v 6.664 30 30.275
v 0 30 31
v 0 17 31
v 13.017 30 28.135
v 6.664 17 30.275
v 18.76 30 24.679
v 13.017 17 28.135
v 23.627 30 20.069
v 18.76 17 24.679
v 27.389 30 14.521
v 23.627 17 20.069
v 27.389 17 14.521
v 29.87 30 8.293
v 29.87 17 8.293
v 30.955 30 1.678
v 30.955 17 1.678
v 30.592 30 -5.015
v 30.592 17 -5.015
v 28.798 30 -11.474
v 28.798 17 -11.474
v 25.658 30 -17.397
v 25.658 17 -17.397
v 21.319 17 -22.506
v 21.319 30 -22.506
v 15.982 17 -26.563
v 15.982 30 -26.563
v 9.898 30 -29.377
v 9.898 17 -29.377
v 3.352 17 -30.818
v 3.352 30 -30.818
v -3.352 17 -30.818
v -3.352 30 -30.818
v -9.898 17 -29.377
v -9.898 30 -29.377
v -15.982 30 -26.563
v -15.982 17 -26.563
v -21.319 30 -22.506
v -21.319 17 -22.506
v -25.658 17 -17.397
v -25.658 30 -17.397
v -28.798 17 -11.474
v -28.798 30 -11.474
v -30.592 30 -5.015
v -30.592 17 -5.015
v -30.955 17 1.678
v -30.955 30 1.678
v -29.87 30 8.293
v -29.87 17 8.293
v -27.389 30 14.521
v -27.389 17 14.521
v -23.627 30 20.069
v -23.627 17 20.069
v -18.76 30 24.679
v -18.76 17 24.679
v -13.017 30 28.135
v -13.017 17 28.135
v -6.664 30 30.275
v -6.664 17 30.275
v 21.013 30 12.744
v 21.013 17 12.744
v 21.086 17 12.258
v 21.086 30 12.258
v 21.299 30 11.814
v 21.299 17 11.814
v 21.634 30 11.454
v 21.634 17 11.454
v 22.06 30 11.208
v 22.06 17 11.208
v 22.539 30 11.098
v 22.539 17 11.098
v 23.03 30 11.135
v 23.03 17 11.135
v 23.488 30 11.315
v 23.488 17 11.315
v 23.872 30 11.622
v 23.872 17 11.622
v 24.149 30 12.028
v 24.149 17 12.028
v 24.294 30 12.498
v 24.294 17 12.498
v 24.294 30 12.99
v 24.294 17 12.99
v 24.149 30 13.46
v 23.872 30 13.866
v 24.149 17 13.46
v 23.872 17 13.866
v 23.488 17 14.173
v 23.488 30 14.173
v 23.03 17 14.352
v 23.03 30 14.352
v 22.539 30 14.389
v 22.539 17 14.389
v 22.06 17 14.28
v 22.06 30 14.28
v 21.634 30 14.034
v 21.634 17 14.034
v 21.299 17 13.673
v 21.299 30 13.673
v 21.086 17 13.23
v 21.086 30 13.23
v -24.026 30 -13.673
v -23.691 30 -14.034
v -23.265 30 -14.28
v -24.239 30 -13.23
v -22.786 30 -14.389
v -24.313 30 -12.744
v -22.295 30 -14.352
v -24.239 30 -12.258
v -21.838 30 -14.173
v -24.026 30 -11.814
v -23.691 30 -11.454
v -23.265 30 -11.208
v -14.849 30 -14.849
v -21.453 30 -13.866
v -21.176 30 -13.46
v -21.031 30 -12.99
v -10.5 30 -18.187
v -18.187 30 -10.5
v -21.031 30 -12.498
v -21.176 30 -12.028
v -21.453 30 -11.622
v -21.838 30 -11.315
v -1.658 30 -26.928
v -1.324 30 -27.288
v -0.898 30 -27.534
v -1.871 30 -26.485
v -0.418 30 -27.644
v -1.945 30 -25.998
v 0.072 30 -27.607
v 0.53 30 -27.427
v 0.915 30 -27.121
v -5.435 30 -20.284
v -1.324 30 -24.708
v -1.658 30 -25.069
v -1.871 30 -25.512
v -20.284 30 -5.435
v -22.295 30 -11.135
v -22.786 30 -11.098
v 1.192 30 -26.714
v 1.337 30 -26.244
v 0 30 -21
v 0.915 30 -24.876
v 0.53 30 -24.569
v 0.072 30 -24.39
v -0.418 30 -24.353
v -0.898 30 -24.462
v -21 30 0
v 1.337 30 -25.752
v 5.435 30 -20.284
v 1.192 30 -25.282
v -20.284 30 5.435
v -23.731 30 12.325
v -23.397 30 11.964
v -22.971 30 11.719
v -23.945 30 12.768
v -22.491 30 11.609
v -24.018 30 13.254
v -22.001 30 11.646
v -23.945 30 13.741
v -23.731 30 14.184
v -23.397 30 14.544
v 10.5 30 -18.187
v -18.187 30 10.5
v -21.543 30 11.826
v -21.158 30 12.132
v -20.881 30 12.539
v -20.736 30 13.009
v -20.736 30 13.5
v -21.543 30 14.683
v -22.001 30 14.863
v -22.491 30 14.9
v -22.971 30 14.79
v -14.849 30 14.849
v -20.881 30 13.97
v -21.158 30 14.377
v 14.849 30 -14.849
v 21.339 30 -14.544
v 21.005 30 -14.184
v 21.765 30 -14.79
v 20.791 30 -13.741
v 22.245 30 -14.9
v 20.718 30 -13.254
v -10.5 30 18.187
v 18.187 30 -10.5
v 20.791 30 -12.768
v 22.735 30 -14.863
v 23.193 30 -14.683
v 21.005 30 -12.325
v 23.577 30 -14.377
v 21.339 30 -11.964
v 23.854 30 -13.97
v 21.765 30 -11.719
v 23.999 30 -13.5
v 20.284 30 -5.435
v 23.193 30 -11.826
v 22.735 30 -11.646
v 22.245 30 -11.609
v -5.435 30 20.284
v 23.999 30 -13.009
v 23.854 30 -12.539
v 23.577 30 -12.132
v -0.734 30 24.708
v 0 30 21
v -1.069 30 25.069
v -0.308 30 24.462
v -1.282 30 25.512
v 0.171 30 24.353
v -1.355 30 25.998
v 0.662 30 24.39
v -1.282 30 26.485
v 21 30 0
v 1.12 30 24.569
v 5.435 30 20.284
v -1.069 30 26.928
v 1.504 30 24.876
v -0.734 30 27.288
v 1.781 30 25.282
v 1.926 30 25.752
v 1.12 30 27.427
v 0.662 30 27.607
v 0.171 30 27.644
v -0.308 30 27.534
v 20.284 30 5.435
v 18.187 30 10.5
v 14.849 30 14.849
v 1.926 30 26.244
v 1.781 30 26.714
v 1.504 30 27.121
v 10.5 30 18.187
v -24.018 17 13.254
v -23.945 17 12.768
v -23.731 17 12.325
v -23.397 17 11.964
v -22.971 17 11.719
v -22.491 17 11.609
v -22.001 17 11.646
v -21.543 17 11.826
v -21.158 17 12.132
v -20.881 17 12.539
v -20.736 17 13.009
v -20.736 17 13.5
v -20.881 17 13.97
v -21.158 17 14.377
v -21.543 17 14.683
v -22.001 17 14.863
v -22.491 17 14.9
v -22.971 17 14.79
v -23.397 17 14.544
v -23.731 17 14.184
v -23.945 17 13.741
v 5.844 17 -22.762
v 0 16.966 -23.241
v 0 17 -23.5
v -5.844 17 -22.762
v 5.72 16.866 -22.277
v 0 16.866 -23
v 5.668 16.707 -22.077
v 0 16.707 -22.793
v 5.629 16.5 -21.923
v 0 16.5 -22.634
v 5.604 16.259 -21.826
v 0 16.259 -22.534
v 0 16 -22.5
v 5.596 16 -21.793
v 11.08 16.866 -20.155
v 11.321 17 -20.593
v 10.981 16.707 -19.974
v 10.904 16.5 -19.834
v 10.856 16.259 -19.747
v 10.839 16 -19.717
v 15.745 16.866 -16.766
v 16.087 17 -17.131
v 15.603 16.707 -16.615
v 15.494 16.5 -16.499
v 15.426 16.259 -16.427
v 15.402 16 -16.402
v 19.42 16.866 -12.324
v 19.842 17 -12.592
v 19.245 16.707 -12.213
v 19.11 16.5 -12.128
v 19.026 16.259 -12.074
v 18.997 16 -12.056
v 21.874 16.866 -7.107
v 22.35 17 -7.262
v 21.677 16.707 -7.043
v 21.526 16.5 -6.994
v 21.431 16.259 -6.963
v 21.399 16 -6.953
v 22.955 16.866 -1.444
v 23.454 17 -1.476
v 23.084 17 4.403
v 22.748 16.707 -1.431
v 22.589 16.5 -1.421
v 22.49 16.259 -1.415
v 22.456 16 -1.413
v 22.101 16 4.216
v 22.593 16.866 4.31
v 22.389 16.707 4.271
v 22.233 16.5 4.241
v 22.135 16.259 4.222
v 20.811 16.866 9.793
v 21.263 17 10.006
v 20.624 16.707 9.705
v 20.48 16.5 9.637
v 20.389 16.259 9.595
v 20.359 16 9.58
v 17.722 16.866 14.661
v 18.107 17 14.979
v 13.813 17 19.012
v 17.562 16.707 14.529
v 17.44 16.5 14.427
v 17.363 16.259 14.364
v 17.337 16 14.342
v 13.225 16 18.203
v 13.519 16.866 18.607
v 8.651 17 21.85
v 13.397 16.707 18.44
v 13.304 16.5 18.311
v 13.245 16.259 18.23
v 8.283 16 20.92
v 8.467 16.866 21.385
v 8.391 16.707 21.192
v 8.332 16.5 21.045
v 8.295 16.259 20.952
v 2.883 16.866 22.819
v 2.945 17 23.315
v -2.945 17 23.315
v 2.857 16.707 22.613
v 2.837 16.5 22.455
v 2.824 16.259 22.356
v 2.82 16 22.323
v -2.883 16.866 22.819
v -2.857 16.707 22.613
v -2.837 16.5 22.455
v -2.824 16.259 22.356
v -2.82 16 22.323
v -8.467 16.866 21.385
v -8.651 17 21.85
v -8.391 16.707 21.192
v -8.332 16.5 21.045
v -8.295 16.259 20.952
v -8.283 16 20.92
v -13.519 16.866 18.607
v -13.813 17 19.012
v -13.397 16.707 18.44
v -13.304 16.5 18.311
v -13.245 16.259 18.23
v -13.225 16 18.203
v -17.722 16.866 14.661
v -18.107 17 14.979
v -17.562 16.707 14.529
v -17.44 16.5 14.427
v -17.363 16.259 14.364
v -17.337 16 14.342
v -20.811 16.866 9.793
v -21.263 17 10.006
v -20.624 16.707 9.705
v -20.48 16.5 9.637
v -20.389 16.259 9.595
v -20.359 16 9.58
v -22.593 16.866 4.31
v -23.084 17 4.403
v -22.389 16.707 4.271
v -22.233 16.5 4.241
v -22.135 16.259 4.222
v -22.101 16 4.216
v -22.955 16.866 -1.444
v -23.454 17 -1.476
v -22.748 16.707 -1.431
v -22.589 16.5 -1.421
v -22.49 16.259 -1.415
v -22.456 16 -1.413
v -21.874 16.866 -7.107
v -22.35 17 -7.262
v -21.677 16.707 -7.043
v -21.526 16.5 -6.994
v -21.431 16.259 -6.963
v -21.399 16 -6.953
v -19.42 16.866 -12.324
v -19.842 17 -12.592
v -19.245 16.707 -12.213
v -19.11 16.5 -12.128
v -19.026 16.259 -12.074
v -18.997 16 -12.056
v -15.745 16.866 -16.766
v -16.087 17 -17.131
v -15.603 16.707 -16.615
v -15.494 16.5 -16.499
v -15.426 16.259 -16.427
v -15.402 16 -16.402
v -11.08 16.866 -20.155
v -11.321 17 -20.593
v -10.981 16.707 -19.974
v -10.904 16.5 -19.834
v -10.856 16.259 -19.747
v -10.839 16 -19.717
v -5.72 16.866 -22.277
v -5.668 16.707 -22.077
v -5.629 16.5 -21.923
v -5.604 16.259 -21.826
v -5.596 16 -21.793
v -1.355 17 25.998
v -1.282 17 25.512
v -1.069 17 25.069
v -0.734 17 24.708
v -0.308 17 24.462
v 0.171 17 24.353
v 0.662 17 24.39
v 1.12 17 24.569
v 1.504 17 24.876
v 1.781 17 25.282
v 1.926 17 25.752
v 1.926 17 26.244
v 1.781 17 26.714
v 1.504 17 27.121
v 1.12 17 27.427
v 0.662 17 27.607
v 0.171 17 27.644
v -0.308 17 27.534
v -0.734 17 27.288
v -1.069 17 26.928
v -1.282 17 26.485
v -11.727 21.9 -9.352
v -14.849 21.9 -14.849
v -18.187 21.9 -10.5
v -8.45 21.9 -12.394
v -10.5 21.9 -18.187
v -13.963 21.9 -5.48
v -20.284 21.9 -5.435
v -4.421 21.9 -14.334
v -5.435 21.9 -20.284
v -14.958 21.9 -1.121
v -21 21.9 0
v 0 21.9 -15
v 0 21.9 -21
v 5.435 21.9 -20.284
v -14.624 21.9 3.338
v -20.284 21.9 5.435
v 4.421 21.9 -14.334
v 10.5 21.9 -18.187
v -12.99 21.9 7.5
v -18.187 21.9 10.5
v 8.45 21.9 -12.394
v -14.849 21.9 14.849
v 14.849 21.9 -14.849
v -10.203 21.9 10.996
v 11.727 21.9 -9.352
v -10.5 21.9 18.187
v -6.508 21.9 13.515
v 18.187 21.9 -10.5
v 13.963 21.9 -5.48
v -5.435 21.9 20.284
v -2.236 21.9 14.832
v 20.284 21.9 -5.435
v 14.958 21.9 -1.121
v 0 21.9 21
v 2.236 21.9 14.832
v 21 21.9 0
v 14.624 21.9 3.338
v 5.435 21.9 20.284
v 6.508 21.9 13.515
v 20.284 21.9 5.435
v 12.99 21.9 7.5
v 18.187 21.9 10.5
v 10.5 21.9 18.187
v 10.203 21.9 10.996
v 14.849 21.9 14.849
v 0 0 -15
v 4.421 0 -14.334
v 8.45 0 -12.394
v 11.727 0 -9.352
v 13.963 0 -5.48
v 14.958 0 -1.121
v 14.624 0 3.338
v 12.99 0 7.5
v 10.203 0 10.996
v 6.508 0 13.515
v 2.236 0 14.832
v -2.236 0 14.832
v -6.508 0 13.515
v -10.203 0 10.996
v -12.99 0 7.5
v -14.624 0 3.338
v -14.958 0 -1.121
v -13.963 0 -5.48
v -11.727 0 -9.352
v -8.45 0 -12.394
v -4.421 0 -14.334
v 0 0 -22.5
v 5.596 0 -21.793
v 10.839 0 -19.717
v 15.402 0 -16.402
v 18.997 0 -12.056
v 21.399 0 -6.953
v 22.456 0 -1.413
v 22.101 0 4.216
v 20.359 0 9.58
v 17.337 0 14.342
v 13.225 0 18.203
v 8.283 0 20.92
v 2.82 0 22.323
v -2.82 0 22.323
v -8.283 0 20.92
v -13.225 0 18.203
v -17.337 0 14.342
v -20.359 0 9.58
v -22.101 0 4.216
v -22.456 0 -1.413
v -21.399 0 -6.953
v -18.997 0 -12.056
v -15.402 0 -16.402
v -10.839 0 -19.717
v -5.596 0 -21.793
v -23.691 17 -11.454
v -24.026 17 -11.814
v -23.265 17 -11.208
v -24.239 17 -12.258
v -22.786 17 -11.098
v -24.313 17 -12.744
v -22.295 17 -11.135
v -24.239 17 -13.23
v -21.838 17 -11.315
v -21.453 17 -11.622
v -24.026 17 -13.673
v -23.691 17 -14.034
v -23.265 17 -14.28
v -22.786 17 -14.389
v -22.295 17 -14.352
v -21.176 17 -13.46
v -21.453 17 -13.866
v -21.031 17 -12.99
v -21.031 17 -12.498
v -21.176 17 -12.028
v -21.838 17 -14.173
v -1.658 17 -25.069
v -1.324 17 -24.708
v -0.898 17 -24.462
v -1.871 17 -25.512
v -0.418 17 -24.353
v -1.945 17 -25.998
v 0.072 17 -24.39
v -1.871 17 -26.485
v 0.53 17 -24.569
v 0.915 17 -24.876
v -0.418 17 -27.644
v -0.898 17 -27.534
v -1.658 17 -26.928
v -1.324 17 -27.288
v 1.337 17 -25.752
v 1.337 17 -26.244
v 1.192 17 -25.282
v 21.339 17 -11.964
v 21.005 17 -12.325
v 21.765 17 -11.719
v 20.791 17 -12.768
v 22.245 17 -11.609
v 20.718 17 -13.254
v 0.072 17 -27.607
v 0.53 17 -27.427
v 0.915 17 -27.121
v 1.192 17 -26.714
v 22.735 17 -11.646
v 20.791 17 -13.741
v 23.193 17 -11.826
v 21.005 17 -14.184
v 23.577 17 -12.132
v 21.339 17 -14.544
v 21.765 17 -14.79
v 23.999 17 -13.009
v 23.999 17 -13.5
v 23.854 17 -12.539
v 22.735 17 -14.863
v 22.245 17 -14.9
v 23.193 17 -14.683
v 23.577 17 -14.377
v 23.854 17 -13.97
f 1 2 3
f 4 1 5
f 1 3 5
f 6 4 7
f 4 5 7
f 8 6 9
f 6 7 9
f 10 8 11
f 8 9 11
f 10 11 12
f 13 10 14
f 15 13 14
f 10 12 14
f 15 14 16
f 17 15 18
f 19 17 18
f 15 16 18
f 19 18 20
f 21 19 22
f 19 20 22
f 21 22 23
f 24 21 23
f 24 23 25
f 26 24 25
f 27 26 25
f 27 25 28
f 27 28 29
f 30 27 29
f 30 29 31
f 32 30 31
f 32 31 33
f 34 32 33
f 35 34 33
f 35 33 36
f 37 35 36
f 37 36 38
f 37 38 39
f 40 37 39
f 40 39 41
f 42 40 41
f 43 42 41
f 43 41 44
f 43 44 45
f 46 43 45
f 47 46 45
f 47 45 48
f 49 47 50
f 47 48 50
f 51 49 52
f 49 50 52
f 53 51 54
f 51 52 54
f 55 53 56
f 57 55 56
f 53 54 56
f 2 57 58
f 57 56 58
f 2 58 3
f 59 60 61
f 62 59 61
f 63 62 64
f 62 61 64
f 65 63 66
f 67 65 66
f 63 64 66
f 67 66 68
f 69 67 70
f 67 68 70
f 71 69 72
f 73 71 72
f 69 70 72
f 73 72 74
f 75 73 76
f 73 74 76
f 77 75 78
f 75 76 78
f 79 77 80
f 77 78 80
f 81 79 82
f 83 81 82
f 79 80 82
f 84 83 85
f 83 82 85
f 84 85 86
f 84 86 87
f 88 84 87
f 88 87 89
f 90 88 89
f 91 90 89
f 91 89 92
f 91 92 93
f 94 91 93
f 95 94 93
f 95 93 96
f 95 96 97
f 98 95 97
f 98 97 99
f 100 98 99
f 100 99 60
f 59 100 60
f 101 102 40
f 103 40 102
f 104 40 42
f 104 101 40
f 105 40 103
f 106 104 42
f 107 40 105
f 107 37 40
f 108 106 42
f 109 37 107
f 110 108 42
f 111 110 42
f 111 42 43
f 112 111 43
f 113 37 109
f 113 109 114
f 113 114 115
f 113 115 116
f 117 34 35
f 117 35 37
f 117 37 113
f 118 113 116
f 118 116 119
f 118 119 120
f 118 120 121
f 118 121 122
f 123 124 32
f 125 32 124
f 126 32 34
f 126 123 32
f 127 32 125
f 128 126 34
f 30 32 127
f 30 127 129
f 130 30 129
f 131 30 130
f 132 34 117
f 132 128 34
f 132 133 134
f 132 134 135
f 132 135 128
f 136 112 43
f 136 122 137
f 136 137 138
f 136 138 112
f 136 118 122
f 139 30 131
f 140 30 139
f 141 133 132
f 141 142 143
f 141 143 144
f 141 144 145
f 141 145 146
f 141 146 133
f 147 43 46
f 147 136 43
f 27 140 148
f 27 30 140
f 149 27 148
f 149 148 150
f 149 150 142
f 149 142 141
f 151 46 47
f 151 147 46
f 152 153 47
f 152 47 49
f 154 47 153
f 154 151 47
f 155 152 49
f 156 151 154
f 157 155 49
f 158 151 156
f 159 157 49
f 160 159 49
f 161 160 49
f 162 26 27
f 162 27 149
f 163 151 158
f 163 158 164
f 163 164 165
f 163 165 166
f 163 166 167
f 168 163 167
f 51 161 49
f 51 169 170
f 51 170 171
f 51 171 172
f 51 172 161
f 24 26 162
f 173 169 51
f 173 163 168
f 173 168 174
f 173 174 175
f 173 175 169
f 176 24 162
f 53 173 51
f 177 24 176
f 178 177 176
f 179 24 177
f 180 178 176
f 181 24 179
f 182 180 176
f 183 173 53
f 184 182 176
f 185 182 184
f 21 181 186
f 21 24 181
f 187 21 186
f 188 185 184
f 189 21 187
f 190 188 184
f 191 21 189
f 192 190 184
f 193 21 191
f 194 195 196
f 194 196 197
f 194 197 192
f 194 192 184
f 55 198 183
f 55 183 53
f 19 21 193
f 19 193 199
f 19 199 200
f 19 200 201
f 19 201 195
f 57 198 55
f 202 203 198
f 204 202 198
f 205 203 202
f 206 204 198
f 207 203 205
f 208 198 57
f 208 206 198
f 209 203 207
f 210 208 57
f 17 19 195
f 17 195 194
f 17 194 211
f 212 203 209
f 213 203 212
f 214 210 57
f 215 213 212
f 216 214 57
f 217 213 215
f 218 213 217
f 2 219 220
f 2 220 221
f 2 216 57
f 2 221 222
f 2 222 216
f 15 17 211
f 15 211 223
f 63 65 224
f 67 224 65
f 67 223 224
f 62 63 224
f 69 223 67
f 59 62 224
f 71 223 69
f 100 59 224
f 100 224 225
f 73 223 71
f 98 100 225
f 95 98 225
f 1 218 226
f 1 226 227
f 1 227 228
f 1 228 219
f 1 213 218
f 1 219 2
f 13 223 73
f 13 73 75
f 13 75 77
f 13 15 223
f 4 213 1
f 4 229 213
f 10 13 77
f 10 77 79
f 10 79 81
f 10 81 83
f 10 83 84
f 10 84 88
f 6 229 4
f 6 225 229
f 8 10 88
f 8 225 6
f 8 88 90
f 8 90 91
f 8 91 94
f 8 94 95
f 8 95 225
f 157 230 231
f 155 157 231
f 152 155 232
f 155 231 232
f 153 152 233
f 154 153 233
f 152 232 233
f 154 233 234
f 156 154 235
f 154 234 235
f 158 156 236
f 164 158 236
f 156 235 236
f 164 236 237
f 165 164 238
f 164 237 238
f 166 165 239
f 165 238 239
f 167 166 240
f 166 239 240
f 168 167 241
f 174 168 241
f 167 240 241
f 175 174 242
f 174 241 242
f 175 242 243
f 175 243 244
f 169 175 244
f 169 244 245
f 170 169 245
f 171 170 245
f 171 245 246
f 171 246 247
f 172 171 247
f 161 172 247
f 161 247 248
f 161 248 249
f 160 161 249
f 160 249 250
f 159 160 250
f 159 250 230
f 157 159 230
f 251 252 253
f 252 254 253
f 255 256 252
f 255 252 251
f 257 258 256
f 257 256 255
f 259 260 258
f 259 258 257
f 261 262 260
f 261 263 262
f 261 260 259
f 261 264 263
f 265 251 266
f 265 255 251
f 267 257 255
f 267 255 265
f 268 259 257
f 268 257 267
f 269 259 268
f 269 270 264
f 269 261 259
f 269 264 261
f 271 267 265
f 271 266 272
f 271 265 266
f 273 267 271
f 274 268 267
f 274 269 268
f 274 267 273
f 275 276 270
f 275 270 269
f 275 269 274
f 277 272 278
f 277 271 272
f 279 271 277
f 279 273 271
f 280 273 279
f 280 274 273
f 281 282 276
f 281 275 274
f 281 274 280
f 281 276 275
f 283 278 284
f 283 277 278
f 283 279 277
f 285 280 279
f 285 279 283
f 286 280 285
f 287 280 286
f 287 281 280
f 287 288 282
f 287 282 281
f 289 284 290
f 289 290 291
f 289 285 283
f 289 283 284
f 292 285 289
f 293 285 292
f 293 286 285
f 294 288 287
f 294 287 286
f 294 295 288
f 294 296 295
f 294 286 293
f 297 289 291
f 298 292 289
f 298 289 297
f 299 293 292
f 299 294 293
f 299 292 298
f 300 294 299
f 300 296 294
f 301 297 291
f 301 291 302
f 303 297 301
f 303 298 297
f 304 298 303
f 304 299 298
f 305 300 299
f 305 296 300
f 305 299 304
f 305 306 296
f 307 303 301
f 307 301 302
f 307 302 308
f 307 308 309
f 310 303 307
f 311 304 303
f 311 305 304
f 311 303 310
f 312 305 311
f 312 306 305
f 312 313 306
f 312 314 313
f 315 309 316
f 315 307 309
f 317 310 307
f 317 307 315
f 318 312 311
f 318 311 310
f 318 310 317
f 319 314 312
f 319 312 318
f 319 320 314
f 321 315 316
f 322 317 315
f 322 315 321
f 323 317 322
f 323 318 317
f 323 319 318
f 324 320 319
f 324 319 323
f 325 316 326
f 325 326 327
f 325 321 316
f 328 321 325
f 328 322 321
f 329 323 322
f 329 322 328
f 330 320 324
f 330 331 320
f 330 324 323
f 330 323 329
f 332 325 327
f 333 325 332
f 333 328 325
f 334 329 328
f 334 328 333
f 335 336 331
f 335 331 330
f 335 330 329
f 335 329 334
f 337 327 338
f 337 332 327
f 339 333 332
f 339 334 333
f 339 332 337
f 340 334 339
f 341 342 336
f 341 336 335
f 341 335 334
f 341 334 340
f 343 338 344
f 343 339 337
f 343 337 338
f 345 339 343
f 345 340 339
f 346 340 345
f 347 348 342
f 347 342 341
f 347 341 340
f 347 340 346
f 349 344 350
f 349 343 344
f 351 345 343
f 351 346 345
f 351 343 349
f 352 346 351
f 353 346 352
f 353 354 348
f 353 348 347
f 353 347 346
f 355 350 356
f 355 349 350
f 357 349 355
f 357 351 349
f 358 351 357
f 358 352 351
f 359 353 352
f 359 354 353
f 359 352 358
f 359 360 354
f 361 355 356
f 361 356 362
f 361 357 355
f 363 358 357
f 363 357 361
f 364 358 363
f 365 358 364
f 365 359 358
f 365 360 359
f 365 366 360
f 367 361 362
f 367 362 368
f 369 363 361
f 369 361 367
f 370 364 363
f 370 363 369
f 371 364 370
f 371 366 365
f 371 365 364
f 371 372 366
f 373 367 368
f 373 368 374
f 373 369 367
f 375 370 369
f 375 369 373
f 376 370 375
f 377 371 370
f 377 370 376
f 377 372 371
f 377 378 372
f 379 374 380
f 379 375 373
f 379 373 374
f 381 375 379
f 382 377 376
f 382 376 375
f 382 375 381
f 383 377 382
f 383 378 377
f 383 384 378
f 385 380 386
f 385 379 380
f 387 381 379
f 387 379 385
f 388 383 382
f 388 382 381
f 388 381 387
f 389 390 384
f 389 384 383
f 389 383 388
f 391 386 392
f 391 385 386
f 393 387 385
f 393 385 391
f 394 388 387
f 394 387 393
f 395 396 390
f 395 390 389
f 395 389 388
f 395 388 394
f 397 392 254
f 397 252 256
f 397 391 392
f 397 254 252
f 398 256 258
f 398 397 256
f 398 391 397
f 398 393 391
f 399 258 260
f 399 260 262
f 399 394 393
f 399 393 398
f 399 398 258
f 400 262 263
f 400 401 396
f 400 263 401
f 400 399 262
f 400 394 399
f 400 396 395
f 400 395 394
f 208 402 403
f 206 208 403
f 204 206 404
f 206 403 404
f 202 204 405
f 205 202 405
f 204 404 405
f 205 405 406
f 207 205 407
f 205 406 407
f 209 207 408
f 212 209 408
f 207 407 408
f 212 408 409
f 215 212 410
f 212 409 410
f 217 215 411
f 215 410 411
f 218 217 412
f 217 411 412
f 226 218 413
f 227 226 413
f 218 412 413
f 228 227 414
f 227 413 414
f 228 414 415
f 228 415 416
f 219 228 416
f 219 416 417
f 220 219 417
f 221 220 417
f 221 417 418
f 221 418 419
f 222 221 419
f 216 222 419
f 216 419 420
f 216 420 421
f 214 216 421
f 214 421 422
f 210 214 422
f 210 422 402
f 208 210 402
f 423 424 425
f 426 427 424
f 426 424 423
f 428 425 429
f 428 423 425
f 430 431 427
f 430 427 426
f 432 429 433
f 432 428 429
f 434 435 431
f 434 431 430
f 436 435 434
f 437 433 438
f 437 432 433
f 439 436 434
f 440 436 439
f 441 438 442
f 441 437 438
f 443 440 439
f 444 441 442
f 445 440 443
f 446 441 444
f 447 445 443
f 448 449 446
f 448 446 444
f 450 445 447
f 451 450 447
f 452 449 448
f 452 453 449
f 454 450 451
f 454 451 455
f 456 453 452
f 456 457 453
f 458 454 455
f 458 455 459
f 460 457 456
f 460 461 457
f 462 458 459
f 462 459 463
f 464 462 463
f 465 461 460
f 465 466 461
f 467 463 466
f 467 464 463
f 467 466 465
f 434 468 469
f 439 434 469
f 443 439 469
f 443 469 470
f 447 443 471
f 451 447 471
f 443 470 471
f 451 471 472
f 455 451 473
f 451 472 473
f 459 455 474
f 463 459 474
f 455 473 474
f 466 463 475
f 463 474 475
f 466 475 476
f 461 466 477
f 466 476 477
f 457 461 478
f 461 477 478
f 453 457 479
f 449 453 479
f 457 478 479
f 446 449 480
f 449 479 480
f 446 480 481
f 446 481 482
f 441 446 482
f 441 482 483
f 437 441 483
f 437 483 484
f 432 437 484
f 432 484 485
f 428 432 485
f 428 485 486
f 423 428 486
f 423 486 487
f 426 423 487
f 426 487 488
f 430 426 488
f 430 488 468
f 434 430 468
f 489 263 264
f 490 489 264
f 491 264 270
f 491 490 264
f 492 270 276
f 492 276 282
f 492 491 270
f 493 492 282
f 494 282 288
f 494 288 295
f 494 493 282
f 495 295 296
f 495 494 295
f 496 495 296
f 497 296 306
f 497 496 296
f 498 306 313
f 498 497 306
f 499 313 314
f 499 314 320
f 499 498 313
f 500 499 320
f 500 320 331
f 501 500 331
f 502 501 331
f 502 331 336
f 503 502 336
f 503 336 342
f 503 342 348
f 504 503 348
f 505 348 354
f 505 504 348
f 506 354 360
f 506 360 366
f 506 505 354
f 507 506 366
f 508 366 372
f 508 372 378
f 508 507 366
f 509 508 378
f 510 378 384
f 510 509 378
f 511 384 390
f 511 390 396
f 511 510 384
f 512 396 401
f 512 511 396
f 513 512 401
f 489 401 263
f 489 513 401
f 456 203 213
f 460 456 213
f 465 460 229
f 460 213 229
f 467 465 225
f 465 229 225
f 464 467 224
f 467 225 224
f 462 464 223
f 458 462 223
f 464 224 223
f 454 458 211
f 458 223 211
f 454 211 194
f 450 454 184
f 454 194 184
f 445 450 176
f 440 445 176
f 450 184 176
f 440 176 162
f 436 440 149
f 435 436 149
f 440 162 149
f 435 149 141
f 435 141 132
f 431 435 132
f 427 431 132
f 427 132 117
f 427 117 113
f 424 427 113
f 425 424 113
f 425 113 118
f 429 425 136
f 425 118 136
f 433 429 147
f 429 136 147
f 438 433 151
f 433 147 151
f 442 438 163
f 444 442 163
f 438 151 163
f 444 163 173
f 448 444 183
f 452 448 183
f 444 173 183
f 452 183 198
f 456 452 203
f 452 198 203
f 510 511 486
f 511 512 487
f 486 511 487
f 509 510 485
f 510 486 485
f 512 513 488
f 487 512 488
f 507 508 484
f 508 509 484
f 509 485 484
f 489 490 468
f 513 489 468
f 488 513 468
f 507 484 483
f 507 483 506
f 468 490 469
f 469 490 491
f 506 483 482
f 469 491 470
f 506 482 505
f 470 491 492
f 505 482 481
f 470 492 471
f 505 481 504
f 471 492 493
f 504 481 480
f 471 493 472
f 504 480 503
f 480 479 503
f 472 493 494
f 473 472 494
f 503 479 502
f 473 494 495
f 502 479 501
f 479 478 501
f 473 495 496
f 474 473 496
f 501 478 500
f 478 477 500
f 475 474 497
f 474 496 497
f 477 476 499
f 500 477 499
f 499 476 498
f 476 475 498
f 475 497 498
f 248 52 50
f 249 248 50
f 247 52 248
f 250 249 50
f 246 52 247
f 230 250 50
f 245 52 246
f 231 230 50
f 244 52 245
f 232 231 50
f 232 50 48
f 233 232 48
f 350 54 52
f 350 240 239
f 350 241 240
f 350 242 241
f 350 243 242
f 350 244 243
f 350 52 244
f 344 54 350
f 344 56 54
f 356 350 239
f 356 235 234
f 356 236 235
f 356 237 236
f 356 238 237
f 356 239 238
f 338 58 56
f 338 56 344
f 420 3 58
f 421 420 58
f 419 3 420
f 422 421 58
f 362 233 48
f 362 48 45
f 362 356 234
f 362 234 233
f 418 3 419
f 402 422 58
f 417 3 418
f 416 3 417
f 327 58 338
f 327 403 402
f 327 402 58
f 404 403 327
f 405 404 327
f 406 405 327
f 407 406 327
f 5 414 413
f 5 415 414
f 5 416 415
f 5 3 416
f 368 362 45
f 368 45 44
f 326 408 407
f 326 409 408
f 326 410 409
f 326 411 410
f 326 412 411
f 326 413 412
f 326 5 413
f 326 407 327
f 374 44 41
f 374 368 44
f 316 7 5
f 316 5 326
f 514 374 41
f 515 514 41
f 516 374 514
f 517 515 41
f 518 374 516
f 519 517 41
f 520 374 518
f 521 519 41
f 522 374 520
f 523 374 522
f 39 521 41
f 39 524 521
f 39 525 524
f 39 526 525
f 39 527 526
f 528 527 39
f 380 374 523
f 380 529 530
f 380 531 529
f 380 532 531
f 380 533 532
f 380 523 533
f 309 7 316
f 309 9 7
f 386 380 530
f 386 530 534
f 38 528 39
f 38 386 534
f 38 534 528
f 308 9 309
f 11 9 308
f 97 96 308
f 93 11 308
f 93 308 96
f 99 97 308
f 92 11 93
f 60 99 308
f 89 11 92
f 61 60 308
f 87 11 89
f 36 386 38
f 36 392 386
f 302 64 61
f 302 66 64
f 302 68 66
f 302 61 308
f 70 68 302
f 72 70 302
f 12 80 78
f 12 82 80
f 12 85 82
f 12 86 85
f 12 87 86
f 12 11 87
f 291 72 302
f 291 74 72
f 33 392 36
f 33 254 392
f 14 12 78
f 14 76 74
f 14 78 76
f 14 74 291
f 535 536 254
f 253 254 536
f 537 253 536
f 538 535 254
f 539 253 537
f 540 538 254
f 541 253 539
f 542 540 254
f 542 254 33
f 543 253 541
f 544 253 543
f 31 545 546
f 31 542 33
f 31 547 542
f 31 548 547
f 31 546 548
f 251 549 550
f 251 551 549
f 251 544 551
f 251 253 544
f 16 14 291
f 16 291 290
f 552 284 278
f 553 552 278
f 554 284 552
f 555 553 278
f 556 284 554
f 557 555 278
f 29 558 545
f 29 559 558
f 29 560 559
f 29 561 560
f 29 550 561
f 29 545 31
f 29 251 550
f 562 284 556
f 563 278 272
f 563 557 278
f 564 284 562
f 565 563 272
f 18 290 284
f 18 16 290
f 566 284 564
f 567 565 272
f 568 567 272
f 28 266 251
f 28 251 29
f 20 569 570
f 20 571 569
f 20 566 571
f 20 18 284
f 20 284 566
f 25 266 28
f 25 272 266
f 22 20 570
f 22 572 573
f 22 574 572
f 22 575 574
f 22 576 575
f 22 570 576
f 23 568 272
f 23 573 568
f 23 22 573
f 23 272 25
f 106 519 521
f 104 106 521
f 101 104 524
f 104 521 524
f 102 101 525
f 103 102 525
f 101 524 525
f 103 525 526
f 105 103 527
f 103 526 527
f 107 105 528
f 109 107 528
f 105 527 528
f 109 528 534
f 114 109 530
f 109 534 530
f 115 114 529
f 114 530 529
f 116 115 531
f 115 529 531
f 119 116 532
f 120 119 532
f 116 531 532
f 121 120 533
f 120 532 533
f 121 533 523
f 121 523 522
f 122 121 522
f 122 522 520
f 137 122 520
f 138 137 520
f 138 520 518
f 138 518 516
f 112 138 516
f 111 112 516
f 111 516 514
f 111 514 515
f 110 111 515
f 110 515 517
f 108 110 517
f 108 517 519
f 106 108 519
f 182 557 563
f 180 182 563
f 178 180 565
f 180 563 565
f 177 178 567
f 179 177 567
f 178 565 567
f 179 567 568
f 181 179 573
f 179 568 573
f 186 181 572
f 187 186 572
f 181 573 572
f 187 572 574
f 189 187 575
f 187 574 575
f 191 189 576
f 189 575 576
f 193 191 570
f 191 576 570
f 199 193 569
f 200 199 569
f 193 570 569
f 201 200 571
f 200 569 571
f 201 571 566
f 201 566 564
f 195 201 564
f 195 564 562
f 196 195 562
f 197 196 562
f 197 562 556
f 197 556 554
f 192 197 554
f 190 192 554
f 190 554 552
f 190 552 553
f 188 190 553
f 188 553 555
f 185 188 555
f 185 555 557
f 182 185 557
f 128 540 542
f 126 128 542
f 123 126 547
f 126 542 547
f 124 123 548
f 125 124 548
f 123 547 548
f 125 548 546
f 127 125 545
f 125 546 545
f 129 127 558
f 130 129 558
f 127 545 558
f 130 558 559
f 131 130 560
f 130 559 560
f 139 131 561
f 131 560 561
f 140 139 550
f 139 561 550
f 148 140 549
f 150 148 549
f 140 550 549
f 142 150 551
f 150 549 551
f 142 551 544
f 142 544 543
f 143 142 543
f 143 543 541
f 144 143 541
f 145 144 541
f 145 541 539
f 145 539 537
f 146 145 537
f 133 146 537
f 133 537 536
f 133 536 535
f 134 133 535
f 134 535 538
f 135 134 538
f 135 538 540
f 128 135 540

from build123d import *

# Parameters (mm, degrees)
ESBO_O1_R                = 31
RESSALTO_EXTRUS_O1_DEPTH = 30
ESBO_O2_R                = 31
ESBO_O2_R_2              = 22.5
CORTE_EXTRUS_O1_DEPTH    = 17
ESBO_O2_3_R              = 15
CORTE_EXTRUS_O2_DEPTH    = 54.122499941
ESBO_O4_R                = 21
CORTE_EXTRUS_O3_DEPTH    = 8.1
FURO_ROSCADO_DE_M41_D    = 3.3
FILETE1_R                = 1


with BuildPart() as part:
    # Esboço1 → Ressalto-extrusão1 (new body)
    with BuildSketch(Plane(origin=(0, 0, 0), x_dir=(1, 0, 0), z_dir=(0, 1, 0))):
        Circle(ESBO_O1_R)
    extrude(amount=RESSALTO_EXTRUS_O1_DEPTH)

    # Esboço2 → Corte-extrusão1 (cut)
    with BuildSketch(Plane.XZ):
        Circle(ESBO_O2_R)
        Circle(ESBO_O2_R_2, mode=Mode.SUBTRACT)
    extrude(amount=-CORTE_EXTRUS_O1_DEPTH, mode=Mode.SUBTRACT)

    # Esboço2<3> → Corte-extrusão2 (cut, through all)
    with BuildSketch(Plane.XZ):
        Circle(ESBO_O2_3_R)
    extrude(amount=-CORTE_EXTRUS_O2_DEPTH, mode=Mode.SUBTRACT)

    # Esboço4 → Corte-extrusão3 (cut)
    with BuildSketch(Plane(origin=(0, 30, 0), x_dir=(1, 0, 0), z_dir=(0, 1, 0))):
        Circle(ESBO_O4_R)
    extrude(amount=-CORTE_EXTRUS_O3_DEPTH, mode=Mode.SUBTRACT)

    # Furo roscado de M41 (through all)
    with Locations(Plane(origin=(0, 30, 0), x_dir=(1, 0, 0), z_dir=(0, 1, 0))):
        with Locations((-0.294790254, 25.998328768), (22.367818042, 13.254460232), (22.662608295, -12.743868535), (0.294790254, -25.998328768), (-22.367818042, -13.254460232), (-22.662608295, 12.743868535)):
            Hole(FURO_ROSCADO_DE_M41_D / 2)

    # Filete1
    filete1_edges = [part.edges().sort_by_distance(p)[0] for p in [
        (-22.5, 17, 0),
    ]]
    fillet(filete1_edges, radius=FILETE1_R)


solid = part.part
